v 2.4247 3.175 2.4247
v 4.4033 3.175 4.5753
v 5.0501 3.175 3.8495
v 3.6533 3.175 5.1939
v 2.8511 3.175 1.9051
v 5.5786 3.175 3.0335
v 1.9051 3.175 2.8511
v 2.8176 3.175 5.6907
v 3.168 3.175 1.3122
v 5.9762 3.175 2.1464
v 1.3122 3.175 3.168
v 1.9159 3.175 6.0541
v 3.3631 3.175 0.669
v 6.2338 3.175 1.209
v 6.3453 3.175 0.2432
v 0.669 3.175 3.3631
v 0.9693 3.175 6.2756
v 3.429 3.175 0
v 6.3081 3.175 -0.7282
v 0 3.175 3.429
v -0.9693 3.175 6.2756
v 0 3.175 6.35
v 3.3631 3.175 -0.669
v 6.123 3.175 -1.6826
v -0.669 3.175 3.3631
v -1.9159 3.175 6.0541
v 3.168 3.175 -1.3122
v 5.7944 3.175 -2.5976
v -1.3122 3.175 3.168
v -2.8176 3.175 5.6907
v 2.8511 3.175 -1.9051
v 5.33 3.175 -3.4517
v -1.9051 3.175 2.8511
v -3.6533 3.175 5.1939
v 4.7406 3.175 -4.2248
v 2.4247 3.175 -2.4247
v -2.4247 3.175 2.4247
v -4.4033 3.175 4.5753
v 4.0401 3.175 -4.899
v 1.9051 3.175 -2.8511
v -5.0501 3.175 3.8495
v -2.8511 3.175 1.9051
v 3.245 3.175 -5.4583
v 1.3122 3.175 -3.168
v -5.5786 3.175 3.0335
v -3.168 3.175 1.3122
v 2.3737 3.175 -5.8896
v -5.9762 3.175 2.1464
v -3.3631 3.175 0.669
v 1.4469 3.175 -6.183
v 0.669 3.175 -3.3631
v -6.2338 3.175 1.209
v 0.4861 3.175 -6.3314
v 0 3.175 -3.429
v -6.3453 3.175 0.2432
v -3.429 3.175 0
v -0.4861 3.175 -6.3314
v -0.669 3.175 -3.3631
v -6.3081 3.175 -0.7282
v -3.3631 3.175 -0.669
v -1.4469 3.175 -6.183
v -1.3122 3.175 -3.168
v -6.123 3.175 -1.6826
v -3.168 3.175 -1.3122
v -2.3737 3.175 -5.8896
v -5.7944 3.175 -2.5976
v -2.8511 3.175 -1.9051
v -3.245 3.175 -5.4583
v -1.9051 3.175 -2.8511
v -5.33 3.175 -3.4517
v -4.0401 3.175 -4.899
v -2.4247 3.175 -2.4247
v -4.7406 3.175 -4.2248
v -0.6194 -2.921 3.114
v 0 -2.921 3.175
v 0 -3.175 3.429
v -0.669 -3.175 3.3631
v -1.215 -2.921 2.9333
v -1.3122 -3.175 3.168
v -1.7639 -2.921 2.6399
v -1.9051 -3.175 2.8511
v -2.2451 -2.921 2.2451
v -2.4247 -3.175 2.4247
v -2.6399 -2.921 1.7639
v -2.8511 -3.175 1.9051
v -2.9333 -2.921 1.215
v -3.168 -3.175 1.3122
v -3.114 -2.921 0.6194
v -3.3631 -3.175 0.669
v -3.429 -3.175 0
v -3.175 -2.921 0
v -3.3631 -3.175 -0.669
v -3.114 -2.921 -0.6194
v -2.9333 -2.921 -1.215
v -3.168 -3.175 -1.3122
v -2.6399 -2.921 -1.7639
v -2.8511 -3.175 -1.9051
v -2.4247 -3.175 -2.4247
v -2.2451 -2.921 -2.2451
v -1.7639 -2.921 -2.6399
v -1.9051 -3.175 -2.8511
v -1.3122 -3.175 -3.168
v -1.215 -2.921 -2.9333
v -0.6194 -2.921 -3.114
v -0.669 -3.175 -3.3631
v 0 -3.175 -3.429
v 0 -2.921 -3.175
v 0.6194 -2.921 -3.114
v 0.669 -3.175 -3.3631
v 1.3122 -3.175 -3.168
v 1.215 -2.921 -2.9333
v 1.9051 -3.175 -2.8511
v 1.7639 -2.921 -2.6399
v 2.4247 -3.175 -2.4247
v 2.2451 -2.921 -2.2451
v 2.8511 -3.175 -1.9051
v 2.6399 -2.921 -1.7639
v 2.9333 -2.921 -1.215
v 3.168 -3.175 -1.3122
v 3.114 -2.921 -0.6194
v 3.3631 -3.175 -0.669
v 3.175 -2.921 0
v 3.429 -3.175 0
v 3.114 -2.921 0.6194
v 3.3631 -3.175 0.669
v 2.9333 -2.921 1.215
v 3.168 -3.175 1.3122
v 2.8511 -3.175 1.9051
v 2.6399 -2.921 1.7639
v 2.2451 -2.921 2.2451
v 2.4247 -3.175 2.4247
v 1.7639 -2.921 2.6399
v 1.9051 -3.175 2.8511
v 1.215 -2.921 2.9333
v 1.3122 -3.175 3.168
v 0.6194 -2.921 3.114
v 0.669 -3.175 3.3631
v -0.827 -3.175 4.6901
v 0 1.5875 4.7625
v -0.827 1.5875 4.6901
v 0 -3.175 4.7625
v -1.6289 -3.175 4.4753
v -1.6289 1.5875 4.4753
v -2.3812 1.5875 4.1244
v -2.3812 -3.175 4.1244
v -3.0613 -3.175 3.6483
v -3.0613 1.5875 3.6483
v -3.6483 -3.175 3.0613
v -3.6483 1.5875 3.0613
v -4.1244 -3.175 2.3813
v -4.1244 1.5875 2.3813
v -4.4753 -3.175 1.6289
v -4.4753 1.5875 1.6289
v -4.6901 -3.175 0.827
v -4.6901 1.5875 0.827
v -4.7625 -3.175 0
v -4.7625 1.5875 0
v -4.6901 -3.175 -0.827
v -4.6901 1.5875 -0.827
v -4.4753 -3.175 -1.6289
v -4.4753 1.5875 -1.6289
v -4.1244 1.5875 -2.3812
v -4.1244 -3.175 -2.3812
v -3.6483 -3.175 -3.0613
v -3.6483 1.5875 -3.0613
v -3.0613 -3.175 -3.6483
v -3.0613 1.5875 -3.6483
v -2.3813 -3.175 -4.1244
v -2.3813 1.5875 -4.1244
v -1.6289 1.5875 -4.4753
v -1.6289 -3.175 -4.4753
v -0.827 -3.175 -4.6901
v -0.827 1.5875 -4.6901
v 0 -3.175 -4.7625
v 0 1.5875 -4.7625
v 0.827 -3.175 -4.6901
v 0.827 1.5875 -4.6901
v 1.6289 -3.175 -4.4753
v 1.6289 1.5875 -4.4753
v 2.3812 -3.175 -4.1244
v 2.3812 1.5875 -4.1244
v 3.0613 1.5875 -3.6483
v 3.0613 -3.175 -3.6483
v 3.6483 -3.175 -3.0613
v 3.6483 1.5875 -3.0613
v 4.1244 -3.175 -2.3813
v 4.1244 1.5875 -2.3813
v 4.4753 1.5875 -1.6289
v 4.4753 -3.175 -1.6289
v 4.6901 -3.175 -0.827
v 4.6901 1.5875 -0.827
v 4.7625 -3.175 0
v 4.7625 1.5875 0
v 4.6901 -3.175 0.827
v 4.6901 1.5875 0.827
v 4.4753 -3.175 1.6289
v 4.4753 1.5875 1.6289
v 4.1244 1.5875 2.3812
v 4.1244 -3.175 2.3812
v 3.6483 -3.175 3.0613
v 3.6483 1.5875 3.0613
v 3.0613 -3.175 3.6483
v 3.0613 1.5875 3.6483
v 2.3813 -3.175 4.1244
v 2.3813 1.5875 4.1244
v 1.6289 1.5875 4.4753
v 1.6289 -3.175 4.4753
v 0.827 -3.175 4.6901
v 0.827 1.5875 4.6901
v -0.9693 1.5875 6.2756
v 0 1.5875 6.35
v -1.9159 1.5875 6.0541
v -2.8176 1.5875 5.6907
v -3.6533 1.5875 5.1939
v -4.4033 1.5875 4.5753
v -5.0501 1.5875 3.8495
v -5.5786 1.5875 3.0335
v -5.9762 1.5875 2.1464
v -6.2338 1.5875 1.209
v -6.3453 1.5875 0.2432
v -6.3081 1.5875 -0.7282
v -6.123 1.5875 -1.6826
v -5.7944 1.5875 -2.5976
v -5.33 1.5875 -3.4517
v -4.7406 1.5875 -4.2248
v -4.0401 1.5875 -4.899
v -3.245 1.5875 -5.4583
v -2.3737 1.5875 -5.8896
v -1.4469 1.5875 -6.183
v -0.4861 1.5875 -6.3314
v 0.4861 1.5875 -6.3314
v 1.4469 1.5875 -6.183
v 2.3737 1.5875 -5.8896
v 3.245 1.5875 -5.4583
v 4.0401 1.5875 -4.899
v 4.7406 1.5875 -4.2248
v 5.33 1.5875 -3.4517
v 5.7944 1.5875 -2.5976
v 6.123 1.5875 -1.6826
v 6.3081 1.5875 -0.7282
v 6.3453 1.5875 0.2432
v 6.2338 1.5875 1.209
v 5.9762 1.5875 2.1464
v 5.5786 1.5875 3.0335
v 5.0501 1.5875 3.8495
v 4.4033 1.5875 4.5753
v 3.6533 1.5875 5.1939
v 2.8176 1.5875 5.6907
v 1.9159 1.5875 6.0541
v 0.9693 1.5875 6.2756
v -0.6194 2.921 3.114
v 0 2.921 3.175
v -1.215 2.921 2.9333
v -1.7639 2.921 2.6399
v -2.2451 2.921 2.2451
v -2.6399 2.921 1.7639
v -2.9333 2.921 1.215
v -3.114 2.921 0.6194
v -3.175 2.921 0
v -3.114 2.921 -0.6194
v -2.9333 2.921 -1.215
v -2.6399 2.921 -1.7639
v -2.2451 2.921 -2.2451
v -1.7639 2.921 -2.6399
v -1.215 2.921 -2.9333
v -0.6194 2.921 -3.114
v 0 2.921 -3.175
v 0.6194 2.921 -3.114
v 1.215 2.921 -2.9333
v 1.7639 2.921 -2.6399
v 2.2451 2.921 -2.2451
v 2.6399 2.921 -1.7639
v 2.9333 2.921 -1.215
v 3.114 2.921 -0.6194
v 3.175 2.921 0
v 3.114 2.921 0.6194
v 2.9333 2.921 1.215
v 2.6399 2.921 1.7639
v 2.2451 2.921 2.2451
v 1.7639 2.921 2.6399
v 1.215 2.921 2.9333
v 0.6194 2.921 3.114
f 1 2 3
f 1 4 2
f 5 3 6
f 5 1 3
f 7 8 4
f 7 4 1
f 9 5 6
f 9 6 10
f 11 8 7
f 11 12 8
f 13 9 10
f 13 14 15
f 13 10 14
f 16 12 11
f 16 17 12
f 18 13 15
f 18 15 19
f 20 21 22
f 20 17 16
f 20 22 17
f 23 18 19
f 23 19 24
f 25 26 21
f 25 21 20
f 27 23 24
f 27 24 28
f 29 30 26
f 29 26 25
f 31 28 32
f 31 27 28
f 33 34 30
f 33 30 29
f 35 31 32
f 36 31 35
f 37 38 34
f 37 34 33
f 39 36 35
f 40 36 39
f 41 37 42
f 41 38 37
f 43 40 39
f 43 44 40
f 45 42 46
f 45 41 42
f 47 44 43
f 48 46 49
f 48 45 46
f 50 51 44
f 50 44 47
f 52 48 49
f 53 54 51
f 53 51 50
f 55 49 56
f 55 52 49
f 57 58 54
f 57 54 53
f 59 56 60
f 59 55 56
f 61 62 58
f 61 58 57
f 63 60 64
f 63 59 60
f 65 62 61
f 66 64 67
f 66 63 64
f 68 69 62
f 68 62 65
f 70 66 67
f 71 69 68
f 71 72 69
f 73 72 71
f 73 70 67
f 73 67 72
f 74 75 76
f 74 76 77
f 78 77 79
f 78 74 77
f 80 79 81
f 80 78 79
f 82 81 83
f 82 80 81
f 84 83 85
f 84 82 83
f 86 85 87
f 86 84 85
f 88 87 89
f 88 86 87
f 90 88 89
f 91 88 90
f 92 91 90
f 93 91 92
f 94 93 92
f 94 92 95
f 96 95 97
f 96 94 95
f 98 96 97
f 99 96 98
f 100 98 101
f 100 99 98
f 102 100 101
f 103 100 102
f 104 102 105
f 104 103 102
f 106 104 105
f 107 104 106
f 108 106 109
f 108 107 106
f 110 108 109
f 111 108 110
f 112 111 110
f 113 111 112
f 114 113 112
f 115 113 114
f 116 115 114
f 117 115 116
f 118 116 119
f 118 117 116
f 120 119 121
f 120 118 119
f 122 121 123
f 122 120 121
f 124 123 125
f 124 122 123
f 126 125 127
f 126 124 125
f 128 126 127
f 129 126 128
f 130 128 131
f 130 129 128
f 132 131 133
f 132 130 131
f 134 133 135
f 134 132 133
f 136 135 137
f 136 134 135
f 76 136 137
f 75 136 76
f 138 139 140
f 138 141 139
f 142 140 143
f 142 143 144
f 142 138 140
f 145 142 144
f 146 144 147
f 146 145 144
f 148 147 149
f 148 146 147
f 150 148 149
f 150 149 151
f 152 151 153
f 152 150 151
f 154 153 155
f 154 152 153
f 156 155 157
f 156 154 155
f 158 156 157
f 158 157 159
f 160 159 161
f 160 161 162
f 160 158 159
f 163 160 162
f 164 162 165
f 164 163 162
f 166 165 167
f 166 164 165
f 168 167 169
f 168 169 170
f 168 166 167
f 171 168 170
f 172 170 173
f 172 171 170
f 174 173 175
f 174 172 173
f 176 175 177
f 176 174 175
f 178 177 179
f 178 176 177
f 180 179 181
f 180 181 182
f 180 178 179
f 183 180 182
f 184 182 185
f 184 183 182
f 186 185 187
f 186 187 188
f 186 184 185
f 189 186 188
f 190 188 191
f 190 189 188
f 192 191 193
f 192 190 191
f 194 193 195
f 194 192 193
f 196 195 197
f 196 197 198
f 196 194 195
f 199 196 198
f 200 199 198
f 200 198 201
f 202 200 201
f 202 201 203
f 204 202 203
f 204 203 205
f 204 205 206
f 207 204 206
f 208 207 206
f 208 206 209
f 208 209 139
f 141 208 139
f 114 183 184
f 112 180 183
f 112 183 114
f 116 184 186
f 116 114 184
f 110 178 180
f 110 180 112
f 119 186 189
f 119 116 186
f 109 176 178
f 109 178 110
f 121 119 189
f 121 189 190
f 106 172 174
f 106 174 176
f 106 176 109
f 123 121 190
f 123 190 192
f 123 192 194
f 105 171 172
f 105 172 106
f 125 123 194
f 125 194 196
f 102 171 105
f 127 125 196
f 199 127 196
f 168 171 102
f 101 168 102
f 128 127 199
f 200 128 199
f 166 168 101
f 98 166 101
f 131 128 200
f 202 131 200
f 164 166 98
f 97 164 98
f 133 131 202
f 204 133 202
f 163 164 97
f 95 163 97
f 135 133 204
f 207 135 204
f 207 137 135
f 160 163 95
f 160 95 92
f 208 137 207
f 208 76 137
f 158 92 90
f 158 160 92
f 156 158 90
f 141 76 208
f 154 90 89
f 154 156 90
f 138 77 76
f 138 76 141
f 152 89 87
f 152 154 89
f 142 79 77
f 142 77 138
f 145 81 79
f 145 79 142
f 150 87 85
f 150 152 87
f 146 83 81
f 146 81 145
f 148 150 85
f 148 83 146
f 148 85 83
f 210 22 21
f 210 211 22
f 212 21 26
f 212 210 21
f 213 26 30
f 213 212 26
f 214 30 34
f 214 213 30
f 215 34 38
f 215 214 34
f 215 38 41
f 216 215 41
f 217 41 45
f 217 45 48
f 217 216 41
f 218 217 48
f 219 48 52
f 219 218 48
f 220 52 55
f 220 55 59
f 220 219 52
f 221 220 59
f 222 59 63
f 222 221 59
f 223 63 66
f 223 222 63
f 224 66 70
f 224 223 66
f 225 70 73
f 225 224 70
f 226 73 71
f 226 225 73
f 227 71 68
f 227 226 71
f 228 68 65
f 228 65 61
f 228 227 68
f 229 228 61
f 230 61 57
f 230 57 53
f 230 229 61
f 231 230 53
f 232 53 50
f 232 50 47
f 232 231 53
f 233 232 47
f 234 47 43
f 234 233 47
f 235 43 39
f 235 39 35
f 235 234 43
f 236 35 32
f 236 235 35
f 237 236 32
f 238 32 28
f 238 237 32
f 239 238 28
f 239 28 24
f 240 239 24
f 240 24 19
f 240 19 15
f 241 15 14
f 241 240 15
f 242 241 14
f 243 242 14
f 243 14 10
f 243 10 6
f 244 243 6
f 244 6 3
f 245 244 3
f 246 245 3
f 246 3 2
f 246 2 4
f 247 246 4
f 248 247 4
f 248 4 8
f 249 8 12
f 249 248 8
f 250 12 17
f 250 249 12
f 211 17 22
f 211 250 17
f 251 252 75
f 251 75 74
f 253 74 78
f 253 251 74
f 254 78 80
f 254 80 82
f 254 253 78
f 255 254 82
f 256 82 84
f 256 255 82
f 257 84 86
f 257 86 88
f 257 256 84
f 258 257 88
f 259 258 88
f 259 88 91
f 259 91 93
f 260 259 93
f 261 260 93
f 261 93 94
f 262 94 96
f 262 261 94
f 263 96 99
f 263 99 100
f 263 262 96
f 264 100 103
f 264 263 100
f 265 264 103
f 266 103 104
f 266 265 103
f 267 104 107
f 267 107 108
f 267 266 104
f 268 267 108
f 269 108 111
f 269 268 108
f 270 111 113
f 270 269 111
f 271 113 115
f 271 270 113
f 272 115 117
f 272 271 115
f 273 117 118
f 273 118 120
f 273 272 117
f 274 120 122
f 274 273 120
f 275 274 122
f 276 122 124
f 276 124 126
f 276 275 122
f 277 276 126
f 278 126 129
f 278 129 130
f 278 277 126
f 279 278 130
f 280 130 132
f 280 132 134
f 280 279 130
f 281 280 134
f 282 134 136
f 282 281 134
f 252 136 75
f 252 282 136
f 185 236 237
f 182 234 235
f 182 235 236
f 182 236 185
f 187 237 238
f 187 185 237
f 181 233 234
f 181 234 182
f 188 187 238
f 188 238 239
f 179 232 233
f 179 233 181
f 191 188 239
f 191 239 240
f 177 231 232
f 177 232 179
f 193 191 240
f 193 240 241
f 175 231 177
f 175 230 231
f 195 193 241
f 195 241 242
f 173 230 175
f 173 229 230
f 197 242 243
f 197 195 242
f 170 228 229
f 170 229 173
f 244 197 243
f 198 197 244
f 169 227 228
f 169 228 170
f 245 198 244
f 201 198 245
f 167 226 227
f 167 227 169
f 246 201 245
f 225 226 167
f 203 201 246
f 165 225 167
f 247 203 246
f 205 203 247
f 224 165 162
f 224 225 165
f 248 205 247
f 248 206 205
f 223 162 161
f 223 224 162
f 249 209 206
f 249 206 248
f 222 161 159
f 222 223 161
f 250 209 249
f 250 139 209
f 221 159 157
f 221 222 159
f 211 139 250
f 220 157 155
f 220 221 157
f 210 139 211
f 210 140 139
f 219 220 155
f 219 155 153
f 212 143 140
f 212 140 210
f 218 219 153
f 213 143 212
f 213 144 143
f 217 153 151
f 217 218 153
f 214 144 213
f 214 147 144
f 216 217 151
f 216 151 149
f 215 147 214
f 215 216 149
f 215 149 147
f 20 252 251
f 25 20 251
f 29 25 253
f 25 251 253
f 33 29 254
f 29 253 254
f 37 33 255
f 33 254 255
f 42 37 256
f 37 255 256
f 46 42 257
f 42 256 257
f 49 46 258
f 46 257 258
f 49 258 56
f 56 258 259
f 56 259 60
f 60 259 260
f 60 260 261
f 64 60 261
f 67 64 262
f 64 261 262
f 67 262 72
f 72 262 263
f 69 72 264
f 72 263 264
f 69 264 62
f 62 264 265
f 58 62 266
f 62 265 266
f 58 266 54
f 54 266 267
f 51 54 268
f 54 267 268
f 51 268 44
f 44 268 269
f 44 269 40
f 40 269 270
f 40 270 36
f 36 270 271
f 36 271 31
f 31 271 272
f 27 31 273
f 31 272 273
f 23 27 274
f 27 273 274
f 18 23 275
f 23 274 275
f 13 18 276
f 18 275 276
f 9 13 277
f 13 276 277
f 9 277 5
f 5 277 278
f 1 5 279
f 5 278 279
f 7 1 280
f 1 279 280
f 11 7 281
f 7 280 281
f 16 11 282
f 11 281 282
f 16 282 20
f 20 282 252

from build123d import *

# Parameters (mm, degrees)
CHAMFER1_SIZE = 0.254


with BuildPart() as part:
    # Sketch1 → Revolve1 (revolve)
    with BuildSketch(Plane.XY, mode=Mode.PRIVATE) as revolve1_sk:
        Polygon((-3.175, 3.175), (-6.35, 3.175), (-6.35, 1.5875), (-4.7625, 1.5875), (-4.7625, -3.175), (-3.175, -3.175), align=None)
    revolve(revolve1_sk.sketch.rotate(Axis((0, 6.35, 0), (0, -1, 0)), 270), axis=Axis((0, 6.35, 0), (0, -1, 0)))

    # Chamfer1
    chamfer1_edges = [part.edges().sort_by_distance(p)[0] for p in [
        (0, -3.175, -3.175),
        (0, 3.175, -3.175),
    ]]
    chamfer(chamfer1_edges, length=CHAMFER1_SIZE)


solid = part.part
